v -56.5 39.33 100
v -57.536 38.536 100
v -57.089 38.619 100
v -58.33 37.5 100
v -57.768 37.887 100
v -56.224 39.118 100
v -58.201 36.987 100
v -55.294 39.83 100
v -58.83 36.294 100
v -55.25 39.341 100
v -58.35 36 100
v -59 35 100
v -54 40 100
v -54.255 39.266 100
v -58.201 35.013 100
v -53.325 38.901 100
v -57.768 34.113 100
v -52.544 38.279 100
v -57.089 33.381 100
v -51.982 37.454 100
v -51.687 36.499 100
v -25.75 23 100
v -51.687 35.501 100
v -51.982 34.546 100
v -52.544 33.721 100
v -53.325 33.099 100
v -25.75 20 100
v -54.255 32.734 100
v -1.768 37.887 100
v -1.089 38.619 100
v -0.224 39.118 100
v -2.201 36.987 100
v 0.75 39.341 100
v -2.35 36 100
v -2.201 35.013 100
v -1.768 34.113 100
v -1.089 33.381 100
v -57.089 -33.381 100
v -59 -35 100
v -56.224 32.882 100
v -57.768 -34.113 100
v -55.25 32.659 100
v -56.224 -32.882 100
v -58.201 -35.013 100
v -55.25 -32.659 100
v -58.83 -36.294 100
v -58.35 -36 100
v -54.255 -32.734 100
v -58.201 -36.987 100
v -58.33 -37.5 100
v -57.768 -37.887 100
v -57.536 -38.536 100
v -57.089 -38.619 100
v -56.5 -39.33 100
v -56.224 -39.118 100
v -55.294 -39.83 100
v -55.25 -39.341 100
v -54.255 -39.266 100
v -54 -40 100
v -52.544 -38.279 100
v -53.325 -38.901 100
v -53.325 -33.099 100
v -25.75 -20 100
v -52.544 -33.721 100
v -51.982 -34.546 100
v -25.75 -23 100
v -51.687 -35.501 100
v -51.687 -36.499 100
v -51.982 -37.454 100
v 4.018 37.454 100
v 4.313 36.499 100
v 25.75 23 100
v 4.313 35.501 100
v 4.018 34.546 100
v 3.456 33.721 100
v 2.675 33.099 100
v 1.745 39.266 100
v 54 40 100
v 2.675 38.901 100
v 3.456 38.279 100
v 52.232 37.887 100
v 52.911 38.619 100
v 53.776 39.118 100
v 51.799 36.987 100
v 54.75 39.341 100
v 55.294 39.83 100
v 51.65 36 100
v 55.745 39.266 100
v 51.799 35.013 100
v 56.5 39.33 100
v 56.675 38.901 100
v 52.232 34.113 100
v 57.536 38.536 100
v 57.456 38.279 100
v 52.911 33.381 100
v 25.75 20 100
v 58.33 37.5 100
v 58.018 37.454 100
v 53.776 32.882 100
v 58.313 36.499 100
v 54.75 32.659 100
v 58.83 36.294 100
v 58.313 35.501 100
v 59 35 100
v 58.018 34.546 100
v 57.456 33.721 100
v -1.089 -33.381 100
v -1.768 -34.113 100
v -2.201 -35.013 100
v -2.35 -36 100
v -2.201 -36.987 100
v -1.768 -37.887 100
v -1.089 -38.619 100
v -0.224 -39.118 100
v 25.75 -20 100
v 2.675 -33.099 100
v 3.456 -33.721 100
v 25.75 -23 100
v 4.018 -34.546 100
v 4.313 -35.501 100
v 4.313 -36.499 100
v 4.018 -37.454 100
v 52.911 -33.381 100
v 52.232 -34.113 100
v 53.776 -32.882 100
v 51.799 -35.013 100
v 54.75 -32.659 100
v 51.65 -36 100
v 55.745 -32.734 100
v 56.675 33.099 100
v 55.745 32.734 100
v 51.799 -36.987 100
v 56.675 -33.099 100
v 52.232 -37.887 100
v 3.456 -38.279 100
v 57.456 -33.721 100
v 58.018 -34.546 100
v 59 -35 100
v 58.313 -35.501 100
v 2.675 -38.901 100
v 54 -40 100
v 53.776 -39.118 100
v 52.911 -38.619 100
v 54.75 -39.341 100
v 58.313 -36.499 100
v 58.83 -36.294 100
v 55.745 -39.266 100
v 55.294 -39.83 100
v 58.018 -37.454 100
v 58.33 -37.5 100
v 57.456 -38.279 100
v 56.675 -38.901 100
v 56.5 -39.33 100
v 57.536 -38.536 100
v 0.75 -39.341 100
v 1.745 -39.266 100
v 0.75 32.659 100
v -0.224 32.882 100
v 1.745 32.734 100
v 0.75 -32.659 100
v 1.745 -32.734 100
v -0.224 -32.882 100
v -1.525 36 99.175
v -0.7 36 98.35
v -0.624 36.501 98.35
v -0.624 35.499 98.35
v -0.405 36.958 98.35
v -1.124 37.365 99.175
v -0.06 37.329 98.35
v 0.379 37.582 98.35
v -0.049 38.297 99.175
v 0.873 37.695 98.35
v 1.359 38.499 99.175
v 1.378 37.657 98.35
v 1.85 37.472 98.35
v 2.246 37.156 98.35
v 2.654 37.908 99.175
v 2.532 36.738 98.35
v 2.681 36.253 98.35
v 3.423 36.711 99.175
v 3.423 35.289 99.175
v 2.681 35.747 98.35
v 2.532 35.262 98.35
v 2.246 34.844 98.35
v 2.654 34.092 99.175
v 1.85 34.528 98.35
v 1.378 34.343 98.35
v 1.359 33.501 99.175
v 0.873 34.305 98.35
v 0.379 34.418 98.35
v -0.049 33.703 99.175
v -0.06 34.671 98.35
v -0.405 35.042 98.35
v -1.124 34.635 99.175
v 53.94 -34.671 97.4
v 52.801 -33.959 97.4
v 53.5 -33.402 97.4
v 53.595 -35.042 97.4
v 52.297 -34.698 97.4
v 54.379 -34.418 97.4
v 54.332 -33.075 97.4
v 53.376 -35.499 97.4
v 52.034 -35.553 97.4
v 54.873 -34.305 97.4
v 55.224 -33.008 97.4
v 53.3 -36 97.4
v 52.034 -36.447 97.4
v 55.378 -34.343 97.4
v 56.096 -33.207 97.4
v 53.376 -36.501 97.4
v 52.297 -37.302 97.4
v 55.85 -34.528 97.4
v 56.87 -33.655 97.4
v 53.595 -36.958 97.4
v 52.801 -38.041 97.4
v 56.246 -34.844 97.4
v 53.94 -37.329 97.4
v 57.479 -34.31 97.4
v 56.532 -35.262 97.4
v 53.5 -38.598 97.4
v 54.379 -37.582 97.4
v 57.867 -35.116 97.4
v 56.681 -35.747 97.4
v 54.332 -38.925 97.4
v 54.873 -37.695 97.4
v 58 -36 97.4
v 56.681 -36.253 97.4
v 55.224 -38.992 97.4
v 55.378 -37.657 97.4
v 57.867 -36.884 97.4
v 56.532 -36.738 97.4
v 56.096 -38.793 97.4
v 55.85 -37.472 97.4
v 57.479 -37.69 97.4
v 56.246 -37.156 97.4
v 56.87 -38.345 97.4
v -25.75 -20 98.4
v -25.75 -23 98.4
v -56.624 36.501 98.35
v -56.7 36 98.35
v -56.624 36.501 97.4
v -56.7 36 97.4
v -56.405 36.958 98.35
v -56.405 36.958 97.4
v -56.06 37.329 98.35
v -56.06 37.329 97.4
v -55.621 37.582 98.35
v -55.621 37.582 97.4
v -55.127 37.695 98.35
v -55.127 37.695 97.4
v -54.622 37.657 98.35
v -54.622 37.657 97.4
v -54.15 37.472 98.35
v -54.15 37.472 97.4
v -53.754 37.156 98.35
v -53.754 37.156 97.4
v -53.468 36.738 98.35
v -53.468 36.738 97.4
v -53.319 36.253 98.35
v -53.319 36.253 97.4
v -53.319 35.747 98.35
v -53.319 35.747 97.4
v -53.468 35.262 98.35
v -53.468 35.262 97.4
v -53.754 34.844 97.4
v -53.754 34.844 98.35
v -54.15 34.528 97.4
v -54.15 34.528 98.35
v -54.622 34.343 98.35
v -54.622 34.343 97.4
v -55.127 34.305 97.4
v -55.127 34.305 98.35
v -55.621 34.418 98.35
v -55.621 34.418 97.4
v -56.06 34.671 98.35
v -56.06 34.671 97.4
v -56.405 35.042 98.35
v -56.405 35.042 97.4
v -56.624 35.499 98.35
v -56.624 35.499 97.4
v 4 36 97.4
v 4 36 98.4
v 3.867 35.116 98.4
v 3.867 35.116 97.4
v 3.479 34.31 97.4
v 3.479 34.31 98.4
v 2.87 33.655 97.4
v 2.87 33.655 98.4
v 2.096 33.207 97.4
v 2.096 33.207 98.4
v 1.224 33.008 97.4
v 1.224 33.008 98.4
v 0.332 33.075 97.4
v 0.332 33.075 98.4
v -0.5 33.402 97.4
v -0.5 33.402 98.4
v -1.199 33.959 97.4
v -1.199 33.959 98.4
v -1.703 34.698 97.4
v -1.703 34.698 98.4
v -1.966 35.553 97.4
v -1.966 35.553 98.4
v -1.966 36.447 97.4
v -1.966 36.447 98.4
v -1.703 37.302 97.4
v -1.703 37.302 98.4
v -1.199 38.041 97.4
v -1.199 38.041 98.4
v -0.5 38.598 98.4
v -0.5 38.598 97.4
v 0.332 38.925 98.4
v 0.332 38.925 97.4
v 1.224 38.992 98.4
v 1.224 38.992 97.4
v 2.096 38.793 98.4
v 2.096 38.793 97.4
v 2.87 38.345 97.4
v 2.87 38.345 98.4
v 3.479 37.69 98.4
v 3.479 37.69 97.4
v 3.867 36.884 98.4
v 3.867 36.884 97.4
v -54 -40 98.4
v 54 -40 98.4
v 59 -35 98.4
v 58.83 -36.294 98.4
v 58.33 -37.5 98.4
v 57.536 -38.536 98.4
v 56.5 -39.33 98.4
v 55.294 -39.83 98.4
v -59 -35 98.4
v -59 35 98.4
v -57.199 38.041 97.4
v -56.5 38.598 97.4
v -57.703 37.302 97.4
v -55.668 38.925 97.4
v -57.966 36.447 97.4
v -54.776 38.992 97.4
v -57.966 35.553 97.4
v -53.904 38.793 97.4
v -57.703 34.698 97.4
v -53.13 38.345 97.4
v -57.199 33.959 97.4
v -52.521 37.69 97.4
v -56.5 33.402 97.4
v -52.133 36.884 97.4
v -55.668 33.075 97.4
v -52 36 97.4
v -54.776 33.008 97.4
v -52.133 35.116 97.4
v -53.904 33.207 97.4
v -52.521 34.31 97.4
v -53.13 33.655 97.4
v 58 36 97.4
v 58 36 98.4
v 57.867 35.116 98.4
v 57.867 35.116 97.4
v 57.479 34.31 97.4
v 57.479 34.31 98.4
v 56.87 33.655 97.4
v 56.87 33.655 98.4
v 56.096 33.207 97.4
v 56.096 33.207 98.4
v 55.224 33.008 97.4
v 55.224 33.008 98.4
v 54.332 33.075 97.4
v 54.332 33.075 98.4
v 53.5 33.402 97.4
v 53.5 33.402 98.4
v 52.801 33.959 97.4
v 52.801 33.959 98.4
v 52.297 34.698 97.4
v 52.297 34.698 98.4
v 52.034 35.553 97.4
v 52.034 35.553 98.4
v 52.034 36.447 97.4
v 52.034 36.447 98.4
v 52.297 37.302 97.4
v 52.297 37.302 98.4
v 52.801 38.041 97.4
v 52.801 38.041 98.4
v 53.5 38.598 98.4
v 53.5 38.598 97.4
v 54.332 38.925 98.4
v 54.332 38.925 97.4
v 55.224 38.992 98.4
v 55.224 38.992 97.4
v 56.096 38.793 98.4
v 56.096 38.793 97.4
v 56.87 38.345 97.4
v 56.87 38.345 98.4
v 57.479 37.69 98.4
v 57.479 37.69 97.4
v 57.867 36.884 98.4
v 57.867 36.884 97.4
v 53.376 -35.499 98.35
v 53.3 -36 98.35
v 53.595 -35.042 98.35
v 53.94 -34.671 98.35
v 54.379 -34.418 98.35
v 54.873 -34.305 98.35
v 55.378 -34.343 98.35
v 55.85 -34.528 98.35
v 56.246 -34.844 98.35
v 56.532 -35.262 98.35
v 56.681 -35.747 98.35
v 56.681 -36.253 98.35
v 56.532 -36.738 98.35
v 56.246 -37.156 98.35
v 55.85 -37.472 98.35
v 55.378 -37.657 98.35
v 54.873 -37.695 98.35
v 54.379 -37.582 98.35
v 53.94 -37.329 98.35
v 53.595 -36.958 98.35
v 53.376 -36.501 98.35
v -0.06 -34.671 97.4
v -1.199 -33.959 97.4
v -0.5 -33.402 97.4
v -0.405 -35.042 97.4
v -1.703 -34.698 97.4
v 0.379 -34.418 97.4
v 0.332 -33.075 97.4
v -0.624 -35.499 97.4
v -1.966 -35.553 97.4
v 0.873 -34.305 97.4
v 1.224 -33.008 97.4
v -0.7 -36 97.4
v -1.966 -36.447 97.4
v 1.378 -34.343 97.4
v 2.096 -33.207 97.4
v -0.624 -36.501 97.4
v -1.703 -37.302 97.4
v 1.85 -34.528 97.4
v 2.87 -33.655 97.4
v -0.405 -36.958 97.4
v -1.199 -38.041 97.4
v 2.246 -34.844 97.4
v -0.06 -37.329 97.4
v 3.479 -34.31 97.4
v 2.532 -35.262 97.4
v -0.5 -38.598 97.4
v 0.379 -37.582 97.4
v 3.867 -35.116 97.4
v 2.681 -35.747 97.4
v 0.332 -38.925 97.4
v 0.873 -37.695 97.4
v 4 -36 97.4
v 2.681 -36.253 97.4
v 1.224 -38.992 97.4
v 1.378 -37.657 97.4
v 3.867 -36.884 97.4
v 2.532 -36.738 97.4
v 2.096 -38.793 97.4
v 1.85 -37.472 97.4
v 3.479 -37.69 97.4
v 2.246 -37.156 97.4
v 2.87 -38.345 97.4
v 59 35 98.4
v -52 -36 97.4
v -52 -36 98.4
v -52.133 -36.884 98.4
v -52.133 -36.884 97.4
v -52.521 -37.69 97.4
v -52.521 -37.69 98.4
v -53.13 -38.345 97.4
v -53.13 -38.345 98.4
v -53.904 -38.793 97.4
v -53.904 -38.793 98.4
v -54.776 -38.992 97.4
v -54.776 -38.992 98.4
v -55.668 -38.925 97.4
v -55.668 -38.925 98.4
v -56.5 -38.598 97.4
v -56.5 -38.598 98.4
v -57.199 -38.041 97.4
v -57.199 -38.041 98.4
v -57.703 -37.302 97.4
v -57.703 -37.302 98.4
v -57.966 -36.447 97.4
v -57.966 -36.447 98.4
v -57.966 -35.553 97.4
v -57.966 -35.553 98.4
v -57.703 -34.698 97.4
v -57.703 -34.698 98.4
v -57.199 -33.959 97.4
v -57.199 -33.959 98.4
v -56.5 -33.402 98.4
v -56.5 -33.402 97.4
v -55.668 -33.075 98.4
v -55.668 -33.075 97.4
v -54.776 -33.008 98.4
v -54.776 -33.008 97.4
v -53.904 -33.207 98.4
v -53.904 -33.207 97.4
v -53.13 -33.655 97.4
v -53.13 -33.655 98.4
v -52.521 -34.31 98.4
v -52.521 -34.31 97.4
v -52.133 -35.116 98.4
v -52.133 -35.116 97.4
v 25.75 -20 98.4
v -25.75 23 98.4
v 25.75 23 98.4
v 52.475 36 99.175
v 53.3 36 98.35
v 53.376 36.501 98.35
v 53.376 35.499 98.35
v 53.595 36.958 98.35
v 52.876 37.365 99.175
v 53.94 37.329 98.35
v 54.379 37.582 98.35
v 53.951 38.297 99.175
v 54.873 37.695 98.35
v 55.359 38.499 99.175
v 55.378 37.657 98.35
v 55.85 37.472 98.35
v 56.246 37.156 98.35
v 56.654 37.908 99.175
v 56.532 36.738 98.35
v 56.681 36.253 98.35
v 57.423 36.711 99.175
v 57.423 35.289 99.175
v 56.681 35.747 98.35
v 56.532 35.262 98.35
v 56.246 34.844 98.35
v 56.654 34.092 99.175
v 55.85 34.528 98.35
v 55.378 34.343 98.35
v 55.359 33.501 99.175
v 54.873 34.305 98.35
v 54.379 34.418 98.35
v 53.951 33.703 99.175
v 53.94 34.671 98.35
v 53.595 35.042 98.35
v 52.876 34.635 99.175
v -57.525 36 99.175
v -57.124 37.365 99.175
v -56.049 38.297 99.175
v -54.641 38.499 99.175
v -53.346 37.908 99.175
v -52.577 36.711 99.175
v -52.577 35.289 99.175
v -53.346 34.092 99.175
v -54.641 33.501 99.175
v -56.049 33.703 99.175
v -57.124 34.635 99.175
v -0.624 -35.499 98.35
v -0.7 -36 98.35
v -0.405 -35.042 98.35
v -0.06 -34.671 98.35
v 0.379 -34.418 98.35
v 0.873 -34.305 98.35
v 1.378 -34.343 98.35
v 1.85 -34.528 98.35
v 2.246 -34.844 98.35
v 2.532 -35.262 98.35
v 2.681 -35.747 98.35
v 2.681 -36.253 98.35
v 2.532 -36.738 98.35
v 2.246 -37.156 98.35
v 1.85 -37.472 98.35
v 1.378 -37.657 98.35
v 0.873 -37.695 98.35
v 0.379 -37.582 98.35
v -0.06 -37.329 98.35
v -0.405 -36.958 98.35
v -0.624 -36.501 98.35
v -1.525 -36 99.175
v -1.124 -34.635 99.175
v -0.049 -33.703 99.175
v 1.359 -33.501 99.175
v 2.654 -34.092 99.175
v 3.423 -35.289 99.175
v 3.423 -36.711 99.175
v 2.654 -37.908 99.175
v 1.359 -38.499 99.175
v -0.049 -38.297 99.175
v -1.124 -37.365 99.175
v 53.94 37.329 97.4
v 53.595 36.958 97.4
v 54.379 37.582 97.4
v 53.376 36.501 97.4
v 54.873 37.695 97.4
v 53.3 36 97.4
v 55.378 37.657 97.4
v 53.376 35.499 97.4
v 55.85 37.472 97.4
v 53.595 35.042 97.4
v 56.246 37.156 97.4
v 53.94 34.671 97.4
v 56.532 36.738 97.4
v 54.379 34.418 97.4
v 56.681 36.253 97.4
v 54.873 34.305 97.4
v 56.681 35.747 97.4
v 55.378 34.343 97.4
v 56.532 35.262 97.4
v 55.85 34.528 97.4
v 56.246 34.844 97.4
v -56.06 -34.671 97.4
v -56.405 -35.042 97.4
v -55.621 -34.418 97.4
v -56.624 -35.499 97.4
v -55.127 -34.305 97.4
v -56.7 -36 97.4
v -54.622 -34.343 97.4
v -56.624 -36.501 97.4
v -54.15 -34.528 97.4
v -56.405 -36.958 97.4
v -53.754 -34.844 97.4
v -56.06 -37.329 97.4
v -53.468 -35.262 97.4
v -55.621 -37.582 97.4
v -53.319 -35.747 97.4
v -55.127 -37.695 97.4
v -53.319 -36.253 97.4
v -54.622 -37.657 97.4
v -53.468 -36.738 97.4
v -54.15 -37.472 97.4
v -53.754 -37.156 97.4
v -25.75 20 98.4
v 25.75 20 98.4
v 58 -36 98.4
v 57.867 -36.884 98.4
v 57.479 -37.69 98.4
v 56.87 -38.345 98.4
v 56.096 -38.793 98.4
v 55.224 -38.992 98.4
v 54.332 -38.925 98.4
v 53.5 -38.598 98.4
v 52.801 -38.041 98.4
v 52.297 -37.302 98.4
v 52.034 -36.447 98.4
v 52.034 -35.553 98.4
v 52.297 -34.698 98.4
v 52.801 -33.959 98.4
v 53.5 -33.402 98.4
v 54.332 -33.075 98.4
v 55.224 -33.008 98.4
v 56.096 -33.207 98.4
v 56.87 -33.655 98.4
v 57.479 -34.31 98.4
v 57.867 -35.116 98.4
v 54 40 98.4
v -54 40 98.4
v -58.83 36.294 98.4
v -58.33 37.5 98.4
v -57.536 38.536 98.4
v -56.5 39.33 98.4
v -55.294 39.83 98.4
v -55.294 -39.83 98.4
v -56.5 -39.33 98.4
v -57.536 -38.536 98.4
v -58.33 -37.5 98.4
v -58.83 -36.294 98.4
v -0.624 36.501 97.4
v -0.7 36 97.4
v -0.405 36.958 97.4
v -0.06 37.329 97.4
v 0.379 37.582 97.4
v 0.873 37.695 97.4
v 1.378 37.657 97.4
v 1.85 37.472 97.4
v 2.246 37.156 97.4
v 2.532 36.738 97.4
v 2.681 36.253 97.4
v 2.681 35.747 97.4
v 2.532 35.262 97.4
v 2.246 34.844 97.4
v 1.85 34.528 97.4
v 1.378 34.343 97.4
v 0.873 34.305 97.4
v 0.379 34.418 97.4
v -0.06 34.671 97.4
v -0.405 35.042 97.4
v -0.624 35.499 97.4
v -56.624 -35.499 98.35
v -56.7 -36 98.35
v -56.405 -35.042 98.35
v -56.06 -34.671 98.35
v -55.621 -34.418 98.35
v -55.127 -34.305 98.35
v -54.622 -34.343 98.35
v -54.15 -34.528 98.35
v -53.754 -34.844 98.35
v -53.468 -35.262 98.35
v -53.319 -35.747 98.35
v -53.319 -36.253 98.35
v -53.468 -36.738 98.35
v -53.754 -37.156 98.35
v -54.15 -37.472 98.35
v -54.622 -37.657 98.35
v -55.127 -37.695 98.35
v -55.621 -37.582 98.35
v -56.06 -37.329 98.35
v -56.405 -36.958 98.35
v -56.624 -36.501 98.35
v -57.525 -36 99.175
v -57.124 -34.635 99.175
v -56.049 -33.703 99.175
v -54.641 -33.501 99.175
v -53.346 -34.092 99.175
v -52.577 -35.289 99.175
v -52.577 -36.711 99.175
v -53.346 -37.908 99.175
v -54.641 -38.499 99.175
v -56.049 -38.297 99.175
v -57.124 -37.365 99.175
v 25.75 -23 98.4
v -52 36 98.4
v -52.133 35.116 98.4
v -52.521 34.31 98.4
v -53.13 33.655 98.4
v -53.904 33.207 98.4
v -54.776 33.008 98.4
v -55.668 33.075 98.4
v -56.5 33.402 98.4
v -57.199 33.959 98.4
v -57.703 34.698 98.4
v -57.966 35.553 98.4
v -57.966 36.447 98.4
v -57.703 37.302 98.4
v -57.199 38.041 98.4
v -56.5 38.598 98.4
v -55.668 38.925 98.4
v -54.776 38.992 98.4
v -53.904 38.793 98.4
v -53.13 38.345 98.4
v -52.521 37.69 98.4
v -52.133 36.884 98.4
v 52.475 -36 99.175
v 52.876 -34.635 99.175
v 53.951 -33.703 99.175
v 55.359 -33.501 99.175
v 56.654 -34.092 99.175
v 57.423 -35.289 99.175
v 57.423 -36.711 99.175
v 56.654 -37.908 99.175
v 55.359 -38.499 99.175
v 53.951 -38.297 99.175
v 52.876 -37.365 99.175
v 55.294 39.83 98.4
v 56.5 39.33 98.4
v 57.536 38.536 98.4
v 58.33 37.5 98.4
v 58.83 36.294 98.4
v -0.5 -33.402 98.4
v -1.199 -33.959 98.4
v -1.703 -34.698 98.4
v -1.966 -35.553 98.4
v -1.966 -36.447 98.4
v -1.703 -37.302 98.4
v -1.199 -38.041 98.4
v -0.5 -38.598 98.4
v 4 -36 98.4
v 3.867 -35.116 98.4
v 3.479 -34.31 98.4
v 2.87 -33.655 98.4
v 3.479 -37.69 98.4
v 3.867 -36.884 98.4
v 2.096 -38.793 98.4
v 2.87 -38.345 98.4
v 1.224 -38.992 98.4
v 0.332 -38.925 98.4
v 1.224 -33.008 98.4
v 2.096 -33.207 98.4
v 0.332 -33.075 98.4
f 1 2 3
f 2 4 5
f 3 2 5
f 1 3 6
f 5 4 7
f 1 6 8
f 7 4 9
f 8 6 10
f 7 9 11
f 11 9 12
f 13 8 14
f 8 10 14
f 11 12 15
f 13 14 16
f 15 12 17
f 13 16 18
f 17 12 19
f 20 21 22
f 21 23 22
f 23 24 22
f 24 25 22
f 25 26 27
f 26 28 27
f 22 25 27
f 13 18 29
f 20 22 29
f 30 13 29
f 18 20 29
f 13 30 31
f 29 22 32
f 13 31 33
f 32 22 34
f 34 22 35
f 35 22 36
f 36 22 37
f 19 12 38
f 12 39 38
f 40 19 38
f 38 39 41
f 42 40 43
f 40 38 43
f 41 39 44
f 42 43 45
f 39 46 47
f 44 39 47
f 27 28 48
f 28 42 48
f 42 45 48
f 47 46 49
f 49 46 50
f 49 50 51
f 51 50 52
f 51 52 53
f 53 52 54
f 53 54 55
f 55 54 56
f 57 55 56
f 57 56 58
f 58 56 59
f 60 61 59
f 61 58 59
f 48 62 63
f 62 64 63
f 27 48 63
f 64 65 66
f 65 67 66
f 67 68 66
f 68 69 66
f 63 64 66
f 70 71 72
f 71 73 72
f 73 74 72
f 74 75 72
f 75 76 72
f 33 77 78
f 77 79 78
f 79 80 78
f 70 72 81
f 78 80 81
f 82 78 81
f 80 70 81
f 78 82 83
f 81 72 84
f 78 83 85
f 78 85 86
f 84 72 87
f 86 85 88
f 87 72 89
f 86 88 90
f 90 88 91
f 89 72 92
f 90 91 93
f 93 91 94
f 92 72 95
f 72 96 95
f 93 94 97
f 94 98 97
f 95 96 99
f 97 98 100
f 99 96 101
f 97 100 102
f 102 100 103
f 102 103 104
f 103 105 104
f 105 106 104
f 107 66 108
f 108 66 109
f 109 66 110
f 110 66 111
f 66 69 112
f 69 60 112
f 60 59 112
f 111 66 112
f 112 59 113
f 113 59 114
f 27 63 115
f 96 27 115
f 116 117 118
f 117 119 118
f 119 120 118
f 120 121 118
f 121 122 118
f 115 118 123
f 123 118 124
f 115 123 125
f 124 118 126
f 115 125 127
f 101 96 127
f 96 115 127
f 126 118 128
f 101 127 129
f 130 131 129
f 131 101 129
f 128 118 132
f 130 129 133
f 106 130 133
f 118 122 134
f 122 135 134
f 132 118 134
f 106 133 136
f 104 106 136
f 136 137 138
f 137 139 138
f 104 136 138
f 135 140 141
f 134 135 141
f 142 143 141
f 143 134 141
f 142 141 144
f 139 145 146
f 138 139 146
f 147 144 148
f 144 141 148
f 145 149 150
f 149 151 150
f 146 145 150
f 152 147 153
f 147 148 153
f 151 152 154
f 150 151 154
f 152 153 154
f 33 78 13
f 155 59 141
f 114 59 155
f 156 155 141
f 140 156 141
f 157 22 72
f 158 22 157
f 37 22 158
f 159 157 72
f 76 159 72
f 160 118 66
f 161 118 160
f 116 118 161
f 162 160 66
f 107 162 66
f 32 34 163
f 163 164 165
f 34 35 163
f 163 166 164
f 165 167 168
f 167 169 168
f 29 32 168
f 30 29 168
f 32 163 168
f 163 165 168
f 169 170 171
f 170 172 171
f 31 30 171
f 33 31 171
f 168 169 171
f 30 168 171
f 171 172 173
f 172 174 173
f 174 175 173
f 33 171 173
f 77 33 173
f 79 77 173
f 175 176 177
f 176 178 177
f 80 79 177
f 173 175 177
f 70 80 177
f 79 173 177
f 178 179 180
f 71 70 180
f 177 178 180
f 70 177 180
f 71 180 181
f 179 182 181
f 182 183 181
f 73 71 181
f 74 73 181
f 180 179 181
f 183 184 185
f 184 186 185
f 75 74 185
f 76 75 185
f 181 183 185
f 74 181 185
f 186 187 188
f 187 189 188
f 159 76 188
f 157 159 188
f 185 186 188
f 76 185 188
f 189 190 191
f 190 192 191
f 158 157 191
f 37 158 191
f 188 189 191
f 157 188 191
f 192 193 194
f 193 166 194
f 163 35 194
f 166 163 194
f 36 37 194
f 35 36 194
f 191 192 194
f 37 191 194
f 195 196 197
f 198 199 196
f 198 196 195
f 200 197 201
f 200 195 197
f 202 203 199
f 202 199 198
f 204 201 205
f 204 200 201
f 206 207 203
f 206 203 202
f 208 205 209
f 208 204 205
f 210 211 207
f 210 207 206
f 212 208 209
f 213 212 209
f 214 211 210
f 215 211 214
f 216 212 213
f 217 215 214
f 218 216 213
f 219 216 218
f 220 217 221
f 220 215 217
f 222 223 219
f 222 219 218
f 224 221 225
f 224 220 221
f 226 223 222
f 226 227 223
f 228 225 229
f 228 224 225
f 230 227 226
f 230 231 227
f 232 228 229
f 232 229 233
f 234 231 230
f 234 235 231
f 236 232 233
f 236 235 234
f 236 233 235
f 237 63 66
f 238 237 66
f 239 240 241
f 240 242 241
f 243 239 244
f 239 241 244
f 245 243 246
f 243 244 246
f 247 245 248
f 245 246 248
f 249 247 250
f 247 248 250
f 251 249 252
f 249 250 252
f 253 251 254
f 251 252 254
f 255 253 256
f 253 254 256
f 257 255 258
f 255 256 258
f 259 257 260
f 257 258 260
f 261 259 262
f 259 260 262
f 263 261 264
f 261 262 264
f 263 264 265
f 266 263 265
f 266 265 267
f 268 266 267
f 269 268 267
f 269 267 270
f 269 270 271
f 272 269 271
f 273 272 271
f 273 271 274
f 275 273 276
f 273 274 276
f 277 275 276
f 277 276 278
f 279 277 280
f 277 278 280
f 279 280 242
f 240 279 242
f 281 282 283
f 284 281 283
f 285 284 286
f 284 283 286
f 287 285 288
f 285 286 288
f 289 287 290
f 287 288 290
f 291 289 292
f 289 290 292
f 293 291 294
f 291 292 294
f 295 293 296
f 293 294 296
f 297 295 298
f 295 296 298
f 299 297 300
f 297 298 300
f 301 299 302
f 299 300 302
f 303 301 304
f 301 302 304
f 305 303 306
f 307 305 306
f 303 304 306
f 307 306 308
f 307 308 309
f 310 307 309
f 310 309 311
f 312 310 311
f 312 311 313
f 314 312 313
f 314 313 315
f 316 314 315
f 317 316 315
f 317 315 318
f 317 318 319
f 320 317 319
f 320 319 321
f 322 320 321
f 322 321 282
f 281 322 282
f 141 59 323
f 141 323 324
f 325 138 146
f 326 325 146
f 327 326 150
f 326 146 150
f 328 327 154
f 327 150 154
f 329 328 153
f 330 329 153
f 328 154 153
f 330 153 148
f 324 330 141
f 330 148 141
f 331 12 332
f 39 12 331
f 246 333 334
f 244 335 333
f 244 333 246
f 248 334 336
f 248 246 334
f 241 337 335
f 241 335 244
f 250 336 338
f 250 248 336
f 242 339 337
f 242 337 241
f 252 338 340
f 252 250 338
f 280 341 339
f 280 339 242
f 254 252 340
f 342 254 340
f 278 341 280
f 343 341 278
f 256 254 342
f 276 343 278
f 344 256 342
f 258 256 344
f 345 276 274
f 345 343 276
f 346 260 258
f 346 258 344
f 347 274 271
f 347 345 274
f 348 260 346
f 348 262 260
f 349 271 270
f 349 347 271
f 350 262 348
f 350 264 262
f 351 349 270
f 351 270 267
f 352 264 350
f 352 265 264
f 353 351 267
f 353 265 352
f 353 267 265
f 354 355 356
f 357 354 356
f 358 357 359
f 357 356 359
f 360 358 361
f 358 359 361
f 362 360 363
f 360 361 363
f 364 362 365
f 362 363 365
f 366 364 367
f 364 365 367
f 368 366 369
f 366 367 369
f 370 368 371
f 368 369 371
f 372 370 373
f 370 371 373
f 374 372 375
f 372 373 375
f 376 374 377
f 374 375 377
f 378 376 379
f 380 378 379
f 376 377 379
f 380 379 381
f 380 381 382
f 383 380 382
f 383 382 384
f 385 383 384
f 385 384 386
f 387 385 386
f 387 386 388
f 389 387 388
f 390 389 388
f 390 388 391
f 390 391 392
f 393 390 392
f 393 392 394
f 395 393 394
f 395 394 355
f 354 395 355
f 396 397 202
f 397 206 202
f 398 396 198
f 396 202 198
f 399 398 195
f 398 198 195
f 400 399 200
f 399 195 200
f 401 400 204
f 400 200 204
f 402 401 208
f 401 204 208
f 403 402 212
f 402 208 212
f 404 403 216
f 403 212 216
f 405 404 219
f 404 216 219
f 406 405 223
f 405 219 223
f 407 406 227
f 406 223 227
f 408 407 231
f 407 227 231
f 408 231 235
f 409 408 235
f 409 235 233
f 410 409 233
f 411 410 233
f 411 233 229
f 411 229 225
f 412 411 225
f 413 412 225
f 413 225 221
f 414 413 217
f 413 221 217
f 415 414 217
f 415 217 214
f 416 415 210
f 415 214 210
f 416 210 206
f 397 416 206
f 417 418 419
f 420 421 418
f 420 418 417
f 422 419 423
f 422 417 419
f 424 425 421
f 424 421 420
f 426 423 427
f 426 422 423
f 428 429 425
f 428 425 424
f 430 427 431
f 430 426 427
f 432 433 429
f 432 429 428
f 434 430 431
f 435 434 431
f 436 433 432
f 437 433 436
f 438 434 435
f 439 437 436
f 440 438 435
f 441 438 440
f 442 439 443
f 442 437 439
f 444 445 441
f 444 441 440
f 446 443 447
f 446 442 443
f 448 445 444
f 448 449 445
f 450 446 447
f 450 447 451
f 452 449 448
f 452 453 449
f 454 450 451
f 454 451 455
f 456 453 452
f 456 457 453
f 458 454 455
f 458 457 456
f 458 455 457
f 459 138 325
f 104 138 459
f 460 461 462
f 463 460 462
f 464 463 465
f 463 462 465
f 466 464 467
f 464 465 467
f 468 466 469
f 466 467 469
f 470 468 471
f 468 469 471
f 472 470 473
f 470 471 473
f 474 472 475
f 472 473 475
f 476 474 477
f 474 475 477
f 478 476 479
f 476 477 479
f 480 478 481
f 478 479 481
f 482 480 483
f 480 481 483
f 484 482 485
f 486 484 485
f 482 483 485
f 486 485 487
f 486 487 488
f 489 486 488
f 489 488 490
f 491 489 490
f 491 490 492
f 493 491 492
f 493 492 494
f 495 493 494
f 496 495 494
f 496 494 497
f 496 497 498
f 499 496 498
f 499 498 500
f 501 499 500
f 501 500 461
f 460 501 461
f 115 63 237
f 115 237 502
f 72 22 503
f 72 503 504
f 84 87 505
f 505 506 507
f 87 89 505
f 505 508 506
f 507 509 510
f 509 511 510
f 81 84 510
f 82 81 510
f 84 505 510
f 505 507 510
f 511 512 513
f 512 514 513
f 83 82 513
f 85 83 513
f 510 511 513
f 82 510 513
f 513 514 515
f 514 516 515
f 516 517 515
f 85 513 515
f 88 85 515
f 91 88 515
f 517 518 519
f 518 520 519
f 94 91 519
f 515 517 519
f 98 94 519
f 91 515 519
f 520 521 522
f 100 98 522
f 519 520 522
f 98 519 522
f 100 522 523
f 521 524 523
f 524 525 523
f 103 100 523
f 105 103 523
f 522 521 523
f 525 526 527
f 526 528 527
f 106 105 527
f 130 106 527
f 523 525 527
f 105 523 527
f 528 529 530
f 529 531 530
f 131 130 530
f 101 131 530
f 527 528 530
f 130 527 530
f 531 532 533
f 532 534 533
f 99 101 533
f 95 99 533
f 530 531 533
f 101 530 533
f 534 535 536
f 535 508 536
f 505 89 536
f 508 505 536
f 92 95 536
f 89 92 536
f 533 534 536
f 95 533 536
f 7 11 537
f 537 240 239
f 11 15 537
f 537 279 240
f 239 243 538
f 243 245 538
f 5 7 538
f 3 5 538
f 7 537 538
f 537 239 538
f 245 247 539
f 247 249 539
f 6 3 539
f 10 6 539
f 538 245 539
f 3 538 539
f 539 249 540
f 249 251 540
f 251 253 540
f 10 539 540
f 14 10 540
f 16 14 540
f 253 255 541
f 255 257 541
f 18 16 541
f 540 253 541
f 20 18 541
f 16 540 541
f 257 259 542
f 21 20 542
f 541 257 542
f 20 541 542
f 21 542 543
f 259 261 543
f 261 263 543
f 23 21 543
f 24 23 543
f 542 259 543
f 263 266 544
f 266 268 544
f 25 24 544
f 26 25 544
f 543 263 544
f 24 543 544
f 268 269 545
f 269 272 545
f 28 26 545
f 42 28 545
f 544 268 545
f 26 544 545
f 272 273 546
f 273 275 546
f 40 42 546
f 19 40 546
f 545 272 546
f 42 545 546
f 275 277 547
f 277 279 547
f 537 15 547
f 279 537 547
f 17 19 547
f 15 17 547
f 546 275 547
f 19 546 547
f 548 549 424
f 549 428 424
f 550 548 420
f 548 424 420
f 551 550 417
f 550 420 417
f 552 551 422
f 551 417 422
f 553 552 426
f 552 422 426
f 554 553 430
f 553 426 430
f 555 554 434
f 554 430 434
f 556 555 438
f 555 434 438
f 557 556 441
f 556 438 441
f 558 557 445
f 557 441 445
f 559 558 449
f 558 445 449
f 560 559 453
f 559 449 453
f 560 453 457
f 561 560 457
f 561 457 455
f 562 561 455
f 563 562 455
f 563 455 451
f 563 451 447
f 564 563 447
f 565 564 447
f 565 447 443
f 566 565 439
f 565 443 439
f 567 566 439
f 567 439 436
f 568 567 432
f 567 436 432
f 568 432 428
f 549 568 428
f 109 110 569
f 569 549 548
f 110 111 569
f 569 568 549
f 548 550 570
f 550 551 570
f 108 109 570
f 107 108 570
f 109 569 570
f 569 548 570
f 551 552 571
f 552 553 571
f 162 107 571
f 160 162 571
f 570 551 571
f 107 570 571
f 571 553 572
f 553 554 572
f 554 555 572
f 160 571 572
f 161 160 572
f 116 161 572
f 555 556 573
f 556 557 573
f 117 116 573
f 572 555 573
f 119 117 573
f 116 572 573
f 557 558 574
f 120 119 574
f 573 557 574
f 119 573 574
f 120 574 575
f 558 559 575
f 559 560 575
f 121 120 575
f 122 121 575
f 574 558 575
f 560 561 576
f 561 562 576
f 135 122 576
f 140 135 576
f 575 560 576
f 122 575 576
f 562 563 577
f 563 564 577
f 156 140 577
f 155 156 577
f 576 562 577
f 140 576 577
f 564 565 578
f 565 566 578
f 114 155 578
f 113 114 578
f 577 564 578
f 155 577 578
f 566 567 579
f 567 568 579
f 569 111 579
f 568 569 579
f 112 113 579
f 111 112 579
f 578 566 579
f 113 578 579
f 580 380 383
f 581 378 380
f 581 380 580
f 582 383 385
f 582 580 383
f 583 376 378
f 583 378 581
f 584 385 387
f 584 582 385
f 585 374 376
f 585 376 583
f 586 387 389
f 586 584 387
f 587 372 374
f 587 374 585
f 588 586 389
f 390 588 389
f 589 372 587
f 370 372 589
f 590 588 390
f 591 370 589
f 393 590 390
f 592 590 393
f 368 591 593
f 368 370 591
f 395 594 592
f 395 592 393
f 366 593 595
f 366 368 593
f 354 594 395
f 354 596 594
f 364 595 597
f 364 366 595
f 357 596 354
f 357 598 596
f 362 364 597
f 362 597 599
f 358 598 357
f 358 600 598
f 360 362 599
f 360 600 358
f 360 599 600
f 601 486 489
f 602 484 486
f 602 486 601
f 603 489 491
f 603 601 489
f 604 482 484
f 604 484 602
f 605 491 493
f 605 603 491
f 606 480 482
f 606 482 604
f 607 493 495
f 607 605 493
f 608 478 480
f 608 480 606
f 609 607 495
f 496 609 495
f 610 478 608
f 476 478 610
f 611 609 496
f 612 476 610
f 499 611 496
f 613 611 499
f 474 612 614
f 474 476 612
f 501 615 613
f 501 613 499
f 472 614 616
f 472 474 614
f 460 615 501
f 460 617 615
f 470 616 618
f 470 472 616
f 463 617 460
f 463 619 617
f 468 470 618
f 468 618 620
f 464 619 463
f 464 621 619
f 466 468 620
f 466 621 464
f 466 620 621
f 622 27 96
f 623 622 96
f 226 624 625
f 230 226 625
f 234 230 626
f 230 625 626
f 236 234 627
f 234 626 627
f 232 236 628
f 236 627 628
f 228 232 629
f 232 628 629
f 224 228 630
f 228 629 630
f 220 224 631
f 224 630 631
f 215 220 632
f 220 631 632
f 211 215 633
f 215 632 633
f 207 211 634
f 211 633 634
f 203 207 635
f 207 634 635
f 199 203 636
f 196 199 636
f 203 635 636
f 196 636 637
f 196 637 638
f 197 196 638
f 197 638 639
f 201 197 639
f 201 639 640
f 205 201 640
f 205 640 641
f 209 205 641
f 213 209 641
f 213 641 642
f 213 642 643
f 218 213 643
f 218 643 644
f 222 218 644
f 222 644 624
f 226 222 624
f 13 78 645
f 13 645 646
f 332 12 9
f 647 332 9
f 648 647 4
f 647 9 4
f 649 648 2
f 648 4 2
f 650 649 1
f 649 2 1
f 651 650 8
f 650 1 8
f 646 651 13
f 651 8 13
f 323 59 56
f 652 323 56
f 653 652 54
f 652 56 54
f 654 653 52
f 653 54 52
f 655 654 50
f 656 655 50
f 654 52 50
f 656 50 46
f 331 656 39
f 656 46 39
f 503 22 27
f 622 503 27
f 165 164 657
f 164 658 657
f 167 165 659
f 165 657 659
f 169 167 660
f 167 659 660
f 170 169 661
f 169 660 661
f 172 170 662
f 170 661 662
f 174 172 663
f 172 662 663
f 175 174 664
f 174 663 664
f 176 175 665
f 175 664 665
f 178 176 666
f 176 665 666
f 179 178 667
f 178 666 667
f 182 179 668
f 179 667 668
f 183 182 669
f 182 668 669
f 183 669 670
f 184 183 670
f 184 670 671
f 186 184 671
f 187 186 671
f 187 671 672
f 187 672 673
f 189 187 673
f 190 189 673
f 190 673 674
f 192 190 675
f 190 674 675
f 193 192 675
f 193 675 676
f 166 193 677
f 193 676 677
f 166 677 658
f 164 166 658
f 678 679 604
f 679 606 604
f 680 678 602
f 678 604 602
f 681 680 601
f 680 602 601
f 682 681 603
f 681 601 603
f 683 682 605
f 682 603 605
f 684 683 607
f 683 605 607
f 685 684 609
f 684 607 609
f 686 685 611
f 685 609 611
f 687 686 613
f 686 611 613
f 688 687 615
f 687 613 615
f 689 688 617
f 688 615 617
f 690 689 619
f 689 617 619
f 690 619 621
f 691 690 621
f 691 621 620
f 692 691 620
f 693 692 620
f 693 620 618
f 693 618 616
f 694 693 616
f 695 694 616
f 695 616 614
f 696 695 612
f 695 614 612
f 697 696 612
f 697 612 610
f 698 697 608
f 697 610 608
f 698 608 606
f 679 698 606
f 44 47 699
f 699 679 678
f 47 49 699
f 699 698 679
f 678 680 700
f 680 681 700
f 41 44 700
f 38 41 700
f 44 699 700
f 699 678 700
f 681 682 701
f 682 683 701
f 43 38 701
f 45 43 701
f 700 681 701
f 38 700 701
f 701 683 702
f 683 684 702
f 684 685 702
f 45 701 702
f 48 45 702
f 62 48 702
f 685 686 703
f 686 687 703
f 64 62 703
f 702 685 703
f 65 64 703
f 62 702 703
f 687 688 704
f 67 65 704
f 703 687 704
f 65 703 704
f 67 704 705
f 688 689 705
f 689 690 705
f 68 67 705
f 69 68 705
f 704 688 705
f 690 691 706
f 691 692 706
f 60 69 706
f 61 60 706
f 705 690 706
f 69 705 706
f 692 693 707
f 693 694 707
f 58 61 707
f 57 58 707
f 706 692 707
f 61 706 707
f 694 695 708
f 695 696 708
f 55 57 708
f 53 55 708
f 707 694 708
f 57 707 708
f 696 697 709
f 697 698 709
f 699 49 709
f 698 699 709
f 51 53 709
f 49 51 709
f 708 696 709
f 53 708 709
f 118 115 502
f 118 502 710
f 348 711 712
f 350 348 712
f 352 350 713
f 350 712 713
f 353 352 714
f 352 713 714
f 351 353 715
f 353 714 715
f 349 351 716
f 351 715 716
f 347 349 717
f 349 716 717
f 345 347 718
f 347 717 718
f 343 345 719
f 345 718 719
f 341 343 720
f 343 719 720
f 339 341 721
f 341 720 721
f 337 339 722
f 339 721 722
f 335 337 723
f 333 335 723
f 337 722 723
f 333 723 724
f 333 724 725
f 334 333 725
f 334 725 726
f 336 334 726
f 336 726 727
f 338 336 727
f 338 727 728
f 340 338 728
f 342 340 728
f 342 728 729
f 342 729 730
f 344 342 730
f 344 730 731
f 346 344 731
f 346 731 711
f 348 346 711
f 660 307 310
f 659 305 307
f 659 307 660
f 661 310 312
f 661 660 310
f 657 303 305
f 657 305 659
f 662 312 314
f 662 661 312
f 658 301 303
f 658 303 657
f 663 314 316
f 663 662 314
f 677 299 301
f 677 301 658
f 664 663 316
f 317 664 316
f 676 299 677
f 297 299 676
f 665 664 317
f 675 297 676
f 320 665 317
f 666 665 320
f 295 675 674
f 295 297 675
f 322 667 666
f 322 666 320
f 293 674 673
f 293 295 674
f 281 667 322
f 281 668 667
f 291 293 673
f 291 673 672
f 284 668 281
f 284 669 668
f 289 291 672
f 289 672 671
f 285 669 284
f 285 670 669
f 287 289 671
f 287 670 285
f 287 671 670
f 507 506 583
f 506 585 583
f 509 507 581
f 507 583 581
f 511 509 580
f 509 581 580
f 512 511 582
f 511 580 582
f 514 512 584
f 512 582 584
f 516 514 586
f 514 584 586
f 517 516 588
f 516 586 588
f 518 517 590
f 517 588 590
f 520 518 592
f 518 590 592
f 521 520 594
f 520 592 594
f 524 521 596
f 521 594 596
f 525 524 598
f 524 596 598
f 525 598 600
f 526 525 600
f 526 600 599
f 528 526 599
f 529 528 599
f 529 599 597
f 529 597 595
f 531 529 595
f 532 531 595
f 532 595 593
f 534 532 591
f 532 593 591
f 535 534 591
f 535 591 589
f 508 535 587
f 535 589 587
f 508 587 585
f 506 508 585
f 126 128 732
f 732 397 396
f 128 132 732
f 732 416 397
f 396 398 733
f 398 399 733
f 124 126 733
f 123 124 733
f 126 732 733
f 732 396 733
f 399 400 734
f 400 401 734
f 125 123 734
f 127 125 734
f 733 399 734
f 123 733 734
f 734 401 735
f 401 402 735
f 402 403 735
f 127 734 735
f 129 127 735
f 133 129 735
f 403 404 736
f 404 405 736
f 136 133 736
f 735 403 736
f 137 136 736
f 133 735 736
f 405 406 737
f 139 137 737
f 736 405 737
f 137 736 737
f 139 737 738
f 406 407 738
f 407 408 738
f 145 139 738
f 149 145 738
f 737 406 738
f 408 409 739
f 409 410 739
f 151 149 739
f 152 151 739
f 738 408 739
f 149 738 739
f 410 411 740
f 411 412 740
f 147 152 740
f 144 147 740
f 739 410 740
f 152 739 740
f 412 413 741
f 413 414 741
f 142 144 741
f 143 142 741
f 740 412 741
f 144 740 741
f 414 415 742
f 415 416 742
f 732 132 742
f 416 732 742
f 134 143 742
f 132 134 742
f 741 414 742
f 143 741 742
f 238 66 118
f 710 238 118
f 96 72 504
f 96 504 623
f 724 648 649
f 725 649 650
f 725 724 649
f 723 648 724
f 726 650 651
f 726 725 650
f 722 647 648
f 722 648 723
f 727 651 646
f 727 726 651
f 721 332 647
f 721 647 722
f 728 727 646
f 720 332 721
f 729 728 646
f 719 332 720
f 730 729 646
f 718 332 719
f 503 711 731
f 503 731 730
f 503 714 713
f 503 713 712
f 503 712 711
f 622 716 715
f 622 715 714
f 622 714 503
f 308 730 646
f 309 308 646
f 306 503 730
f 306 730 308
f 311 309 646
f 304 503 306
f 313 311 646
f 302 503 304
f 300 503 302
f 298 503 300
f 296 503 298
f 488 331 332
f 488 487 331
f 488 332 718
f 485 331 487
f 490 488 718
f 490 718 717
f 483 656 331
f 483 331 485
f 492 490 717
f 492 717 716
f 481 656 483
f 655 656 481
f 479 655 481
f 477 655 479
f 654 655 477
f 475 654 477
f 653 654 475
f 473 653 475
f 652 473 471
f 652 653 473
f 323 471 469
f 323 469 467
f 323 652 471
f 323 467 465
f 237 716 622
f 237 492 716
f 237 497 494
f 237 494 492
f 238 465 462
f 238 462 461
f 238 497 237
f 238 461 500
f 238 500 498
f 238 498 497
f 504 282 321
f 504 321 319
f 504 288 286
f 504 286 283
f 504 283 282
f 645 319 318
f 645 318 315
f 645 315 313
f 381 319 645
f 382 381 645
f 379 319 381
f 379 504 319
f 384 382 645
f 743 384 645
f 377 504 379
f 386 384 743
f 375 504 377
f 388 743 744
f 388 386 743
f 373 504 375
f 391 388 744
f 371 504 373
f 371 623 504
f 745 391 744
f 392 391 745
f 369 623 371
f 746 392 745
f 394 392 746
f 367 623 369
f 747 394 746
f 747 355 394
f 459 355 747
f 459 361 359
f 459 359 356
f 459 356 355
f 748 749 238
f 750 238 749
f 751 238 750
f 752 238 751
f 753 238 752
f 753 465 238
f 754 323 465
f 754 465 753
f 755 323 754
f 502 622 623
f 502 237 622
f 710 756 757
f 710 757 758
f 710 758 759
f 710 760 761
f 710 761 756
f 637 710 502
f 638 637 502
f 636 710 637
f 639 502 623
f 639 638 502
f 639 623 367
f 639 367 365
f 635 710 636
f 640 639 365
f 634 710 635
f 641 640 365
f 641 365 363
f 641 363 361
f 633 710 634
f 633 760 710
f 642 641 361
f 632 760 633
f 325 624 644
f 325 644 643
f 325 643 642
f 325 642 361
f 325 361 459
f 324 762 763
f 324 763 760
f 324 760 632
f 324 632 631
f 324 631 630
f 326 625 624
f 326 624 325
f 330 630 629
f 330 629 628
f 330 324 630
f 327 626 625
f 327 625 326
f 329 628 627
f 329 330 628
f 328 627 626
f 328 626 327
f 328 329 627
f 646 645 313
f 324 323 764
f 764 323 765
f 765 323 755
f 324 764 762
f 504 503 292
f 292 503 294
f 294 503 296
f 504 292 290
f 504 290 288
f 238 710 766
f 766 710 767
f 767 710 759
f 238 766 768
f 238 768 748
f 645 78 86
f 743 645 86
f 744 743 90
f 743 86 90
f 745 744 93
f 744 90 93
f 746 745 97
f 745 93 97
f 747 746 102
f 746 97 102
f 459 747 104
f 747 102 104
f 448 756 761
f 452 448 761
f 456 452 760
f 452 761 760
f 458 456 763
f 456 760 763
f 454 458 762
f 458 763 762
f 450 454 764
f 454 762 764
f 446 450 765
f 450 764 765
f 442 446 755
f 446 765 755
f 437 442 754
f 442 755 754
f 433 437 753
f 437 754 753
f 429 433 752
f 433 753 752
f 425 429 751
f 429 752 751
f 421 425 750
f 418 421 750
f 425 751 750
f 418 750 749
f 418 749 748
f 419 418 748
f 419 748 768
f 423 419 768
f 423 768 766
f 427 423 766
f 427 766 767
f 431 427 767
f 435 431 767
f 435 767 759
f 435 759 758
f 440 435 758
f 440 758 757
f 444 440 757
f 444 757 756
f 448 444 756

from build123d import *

# Parameters (mm, degrees)
SKETCH021_W             = 51.5
SKETCH021_H             = 3
PAD014_DEPTH            = 1.6
SKETCH022_R             = 3
PAD015_DEPTH            = 2.6
HOLE_D                  = 3.4
HOLE_DEPTH              = 25
HOLE_CSINK_D            = 6.7
HOLE_CSINK_ANGLE        = 90
BODY005_PLACEMENT_ANGLE = 180


with BuildPart() as part:
    # Sketch021 → Pad014 (new body)
    with BuildSketch(Plane.XY):
        with BuildLine():
            ThreePointArc((-54, 40), (-57.535534, 38.535534), (-59, 35))
            Line((-59, -35), (-59, 35))
            ThreePointArc((-59, -35), (-57.535534, -38.535534), (-54, -40))
            Line((54, -40), (-54, -40))
            ThreePointArc((54, -40), (57.535534, -38.535534), (59, -35))
            Line((59, 35), (59, -35))
            ThreePointArc((59, 35), (57.535534, 38.535534), (54, 40))
            Line((-54, 40), (54, 40))
        make_face()
        with Locations((0, 21.5)):
            Rectangle(SKETCH021_W, SKETCH021_H, mode=Mode.SUBTRACT)
        with Locations((0, -21.5)):
            Rectangle(SKETCH021_W, SKETCH021_H, mode=Mode.SUBTRACT)
    extrude(amount=PAD014_DEPTH)

    # Sketch022 → Pad015 (join)
    with BuildSketch(Plane.XY):
        with Locations((-55, 36)):
            Circle(SKETCH022_R)
        with Locations((1, 36)):
            Circle(SKETCH022_R)
        with Locations((55, 36)):
            Circle(SKETCH022_R)
        with Locations((55, -36)):
            Circle(SKETCH022_R)
        with Locations((1, -36)):
            Circle(SKETCH022_R)
        with Locations((-55, -36)):
            Circle(SKETCH022_R)
    extrude(amount=PAD015_DEPTH)

    # Hole
    with Locations(Plane(origin=(0, 0, 0), x_dir=(1, 0, 0), z_dir=(0, 0, -1))):
        with Locations((-55, -36), (1, -36), (55, -36), (55, 36), (1, 36), (-55, 36)):
            CounterSinkHole(HOLE_D / 2, HOLE_CSINK_D / 2, depth=HOLE_DEPTH, counter_sink_angle=HOLE_CSINK_ANGLE)


with BuildPart() as part_1:
    # Body005 placement: moved
    add(part.part.moved(Location((0, 0, 100))).rotate(Axis((0, 0, 100), (1, 0, 0)), BODY005_PLACEMENT_ANGLE))


solid = part_1.part
